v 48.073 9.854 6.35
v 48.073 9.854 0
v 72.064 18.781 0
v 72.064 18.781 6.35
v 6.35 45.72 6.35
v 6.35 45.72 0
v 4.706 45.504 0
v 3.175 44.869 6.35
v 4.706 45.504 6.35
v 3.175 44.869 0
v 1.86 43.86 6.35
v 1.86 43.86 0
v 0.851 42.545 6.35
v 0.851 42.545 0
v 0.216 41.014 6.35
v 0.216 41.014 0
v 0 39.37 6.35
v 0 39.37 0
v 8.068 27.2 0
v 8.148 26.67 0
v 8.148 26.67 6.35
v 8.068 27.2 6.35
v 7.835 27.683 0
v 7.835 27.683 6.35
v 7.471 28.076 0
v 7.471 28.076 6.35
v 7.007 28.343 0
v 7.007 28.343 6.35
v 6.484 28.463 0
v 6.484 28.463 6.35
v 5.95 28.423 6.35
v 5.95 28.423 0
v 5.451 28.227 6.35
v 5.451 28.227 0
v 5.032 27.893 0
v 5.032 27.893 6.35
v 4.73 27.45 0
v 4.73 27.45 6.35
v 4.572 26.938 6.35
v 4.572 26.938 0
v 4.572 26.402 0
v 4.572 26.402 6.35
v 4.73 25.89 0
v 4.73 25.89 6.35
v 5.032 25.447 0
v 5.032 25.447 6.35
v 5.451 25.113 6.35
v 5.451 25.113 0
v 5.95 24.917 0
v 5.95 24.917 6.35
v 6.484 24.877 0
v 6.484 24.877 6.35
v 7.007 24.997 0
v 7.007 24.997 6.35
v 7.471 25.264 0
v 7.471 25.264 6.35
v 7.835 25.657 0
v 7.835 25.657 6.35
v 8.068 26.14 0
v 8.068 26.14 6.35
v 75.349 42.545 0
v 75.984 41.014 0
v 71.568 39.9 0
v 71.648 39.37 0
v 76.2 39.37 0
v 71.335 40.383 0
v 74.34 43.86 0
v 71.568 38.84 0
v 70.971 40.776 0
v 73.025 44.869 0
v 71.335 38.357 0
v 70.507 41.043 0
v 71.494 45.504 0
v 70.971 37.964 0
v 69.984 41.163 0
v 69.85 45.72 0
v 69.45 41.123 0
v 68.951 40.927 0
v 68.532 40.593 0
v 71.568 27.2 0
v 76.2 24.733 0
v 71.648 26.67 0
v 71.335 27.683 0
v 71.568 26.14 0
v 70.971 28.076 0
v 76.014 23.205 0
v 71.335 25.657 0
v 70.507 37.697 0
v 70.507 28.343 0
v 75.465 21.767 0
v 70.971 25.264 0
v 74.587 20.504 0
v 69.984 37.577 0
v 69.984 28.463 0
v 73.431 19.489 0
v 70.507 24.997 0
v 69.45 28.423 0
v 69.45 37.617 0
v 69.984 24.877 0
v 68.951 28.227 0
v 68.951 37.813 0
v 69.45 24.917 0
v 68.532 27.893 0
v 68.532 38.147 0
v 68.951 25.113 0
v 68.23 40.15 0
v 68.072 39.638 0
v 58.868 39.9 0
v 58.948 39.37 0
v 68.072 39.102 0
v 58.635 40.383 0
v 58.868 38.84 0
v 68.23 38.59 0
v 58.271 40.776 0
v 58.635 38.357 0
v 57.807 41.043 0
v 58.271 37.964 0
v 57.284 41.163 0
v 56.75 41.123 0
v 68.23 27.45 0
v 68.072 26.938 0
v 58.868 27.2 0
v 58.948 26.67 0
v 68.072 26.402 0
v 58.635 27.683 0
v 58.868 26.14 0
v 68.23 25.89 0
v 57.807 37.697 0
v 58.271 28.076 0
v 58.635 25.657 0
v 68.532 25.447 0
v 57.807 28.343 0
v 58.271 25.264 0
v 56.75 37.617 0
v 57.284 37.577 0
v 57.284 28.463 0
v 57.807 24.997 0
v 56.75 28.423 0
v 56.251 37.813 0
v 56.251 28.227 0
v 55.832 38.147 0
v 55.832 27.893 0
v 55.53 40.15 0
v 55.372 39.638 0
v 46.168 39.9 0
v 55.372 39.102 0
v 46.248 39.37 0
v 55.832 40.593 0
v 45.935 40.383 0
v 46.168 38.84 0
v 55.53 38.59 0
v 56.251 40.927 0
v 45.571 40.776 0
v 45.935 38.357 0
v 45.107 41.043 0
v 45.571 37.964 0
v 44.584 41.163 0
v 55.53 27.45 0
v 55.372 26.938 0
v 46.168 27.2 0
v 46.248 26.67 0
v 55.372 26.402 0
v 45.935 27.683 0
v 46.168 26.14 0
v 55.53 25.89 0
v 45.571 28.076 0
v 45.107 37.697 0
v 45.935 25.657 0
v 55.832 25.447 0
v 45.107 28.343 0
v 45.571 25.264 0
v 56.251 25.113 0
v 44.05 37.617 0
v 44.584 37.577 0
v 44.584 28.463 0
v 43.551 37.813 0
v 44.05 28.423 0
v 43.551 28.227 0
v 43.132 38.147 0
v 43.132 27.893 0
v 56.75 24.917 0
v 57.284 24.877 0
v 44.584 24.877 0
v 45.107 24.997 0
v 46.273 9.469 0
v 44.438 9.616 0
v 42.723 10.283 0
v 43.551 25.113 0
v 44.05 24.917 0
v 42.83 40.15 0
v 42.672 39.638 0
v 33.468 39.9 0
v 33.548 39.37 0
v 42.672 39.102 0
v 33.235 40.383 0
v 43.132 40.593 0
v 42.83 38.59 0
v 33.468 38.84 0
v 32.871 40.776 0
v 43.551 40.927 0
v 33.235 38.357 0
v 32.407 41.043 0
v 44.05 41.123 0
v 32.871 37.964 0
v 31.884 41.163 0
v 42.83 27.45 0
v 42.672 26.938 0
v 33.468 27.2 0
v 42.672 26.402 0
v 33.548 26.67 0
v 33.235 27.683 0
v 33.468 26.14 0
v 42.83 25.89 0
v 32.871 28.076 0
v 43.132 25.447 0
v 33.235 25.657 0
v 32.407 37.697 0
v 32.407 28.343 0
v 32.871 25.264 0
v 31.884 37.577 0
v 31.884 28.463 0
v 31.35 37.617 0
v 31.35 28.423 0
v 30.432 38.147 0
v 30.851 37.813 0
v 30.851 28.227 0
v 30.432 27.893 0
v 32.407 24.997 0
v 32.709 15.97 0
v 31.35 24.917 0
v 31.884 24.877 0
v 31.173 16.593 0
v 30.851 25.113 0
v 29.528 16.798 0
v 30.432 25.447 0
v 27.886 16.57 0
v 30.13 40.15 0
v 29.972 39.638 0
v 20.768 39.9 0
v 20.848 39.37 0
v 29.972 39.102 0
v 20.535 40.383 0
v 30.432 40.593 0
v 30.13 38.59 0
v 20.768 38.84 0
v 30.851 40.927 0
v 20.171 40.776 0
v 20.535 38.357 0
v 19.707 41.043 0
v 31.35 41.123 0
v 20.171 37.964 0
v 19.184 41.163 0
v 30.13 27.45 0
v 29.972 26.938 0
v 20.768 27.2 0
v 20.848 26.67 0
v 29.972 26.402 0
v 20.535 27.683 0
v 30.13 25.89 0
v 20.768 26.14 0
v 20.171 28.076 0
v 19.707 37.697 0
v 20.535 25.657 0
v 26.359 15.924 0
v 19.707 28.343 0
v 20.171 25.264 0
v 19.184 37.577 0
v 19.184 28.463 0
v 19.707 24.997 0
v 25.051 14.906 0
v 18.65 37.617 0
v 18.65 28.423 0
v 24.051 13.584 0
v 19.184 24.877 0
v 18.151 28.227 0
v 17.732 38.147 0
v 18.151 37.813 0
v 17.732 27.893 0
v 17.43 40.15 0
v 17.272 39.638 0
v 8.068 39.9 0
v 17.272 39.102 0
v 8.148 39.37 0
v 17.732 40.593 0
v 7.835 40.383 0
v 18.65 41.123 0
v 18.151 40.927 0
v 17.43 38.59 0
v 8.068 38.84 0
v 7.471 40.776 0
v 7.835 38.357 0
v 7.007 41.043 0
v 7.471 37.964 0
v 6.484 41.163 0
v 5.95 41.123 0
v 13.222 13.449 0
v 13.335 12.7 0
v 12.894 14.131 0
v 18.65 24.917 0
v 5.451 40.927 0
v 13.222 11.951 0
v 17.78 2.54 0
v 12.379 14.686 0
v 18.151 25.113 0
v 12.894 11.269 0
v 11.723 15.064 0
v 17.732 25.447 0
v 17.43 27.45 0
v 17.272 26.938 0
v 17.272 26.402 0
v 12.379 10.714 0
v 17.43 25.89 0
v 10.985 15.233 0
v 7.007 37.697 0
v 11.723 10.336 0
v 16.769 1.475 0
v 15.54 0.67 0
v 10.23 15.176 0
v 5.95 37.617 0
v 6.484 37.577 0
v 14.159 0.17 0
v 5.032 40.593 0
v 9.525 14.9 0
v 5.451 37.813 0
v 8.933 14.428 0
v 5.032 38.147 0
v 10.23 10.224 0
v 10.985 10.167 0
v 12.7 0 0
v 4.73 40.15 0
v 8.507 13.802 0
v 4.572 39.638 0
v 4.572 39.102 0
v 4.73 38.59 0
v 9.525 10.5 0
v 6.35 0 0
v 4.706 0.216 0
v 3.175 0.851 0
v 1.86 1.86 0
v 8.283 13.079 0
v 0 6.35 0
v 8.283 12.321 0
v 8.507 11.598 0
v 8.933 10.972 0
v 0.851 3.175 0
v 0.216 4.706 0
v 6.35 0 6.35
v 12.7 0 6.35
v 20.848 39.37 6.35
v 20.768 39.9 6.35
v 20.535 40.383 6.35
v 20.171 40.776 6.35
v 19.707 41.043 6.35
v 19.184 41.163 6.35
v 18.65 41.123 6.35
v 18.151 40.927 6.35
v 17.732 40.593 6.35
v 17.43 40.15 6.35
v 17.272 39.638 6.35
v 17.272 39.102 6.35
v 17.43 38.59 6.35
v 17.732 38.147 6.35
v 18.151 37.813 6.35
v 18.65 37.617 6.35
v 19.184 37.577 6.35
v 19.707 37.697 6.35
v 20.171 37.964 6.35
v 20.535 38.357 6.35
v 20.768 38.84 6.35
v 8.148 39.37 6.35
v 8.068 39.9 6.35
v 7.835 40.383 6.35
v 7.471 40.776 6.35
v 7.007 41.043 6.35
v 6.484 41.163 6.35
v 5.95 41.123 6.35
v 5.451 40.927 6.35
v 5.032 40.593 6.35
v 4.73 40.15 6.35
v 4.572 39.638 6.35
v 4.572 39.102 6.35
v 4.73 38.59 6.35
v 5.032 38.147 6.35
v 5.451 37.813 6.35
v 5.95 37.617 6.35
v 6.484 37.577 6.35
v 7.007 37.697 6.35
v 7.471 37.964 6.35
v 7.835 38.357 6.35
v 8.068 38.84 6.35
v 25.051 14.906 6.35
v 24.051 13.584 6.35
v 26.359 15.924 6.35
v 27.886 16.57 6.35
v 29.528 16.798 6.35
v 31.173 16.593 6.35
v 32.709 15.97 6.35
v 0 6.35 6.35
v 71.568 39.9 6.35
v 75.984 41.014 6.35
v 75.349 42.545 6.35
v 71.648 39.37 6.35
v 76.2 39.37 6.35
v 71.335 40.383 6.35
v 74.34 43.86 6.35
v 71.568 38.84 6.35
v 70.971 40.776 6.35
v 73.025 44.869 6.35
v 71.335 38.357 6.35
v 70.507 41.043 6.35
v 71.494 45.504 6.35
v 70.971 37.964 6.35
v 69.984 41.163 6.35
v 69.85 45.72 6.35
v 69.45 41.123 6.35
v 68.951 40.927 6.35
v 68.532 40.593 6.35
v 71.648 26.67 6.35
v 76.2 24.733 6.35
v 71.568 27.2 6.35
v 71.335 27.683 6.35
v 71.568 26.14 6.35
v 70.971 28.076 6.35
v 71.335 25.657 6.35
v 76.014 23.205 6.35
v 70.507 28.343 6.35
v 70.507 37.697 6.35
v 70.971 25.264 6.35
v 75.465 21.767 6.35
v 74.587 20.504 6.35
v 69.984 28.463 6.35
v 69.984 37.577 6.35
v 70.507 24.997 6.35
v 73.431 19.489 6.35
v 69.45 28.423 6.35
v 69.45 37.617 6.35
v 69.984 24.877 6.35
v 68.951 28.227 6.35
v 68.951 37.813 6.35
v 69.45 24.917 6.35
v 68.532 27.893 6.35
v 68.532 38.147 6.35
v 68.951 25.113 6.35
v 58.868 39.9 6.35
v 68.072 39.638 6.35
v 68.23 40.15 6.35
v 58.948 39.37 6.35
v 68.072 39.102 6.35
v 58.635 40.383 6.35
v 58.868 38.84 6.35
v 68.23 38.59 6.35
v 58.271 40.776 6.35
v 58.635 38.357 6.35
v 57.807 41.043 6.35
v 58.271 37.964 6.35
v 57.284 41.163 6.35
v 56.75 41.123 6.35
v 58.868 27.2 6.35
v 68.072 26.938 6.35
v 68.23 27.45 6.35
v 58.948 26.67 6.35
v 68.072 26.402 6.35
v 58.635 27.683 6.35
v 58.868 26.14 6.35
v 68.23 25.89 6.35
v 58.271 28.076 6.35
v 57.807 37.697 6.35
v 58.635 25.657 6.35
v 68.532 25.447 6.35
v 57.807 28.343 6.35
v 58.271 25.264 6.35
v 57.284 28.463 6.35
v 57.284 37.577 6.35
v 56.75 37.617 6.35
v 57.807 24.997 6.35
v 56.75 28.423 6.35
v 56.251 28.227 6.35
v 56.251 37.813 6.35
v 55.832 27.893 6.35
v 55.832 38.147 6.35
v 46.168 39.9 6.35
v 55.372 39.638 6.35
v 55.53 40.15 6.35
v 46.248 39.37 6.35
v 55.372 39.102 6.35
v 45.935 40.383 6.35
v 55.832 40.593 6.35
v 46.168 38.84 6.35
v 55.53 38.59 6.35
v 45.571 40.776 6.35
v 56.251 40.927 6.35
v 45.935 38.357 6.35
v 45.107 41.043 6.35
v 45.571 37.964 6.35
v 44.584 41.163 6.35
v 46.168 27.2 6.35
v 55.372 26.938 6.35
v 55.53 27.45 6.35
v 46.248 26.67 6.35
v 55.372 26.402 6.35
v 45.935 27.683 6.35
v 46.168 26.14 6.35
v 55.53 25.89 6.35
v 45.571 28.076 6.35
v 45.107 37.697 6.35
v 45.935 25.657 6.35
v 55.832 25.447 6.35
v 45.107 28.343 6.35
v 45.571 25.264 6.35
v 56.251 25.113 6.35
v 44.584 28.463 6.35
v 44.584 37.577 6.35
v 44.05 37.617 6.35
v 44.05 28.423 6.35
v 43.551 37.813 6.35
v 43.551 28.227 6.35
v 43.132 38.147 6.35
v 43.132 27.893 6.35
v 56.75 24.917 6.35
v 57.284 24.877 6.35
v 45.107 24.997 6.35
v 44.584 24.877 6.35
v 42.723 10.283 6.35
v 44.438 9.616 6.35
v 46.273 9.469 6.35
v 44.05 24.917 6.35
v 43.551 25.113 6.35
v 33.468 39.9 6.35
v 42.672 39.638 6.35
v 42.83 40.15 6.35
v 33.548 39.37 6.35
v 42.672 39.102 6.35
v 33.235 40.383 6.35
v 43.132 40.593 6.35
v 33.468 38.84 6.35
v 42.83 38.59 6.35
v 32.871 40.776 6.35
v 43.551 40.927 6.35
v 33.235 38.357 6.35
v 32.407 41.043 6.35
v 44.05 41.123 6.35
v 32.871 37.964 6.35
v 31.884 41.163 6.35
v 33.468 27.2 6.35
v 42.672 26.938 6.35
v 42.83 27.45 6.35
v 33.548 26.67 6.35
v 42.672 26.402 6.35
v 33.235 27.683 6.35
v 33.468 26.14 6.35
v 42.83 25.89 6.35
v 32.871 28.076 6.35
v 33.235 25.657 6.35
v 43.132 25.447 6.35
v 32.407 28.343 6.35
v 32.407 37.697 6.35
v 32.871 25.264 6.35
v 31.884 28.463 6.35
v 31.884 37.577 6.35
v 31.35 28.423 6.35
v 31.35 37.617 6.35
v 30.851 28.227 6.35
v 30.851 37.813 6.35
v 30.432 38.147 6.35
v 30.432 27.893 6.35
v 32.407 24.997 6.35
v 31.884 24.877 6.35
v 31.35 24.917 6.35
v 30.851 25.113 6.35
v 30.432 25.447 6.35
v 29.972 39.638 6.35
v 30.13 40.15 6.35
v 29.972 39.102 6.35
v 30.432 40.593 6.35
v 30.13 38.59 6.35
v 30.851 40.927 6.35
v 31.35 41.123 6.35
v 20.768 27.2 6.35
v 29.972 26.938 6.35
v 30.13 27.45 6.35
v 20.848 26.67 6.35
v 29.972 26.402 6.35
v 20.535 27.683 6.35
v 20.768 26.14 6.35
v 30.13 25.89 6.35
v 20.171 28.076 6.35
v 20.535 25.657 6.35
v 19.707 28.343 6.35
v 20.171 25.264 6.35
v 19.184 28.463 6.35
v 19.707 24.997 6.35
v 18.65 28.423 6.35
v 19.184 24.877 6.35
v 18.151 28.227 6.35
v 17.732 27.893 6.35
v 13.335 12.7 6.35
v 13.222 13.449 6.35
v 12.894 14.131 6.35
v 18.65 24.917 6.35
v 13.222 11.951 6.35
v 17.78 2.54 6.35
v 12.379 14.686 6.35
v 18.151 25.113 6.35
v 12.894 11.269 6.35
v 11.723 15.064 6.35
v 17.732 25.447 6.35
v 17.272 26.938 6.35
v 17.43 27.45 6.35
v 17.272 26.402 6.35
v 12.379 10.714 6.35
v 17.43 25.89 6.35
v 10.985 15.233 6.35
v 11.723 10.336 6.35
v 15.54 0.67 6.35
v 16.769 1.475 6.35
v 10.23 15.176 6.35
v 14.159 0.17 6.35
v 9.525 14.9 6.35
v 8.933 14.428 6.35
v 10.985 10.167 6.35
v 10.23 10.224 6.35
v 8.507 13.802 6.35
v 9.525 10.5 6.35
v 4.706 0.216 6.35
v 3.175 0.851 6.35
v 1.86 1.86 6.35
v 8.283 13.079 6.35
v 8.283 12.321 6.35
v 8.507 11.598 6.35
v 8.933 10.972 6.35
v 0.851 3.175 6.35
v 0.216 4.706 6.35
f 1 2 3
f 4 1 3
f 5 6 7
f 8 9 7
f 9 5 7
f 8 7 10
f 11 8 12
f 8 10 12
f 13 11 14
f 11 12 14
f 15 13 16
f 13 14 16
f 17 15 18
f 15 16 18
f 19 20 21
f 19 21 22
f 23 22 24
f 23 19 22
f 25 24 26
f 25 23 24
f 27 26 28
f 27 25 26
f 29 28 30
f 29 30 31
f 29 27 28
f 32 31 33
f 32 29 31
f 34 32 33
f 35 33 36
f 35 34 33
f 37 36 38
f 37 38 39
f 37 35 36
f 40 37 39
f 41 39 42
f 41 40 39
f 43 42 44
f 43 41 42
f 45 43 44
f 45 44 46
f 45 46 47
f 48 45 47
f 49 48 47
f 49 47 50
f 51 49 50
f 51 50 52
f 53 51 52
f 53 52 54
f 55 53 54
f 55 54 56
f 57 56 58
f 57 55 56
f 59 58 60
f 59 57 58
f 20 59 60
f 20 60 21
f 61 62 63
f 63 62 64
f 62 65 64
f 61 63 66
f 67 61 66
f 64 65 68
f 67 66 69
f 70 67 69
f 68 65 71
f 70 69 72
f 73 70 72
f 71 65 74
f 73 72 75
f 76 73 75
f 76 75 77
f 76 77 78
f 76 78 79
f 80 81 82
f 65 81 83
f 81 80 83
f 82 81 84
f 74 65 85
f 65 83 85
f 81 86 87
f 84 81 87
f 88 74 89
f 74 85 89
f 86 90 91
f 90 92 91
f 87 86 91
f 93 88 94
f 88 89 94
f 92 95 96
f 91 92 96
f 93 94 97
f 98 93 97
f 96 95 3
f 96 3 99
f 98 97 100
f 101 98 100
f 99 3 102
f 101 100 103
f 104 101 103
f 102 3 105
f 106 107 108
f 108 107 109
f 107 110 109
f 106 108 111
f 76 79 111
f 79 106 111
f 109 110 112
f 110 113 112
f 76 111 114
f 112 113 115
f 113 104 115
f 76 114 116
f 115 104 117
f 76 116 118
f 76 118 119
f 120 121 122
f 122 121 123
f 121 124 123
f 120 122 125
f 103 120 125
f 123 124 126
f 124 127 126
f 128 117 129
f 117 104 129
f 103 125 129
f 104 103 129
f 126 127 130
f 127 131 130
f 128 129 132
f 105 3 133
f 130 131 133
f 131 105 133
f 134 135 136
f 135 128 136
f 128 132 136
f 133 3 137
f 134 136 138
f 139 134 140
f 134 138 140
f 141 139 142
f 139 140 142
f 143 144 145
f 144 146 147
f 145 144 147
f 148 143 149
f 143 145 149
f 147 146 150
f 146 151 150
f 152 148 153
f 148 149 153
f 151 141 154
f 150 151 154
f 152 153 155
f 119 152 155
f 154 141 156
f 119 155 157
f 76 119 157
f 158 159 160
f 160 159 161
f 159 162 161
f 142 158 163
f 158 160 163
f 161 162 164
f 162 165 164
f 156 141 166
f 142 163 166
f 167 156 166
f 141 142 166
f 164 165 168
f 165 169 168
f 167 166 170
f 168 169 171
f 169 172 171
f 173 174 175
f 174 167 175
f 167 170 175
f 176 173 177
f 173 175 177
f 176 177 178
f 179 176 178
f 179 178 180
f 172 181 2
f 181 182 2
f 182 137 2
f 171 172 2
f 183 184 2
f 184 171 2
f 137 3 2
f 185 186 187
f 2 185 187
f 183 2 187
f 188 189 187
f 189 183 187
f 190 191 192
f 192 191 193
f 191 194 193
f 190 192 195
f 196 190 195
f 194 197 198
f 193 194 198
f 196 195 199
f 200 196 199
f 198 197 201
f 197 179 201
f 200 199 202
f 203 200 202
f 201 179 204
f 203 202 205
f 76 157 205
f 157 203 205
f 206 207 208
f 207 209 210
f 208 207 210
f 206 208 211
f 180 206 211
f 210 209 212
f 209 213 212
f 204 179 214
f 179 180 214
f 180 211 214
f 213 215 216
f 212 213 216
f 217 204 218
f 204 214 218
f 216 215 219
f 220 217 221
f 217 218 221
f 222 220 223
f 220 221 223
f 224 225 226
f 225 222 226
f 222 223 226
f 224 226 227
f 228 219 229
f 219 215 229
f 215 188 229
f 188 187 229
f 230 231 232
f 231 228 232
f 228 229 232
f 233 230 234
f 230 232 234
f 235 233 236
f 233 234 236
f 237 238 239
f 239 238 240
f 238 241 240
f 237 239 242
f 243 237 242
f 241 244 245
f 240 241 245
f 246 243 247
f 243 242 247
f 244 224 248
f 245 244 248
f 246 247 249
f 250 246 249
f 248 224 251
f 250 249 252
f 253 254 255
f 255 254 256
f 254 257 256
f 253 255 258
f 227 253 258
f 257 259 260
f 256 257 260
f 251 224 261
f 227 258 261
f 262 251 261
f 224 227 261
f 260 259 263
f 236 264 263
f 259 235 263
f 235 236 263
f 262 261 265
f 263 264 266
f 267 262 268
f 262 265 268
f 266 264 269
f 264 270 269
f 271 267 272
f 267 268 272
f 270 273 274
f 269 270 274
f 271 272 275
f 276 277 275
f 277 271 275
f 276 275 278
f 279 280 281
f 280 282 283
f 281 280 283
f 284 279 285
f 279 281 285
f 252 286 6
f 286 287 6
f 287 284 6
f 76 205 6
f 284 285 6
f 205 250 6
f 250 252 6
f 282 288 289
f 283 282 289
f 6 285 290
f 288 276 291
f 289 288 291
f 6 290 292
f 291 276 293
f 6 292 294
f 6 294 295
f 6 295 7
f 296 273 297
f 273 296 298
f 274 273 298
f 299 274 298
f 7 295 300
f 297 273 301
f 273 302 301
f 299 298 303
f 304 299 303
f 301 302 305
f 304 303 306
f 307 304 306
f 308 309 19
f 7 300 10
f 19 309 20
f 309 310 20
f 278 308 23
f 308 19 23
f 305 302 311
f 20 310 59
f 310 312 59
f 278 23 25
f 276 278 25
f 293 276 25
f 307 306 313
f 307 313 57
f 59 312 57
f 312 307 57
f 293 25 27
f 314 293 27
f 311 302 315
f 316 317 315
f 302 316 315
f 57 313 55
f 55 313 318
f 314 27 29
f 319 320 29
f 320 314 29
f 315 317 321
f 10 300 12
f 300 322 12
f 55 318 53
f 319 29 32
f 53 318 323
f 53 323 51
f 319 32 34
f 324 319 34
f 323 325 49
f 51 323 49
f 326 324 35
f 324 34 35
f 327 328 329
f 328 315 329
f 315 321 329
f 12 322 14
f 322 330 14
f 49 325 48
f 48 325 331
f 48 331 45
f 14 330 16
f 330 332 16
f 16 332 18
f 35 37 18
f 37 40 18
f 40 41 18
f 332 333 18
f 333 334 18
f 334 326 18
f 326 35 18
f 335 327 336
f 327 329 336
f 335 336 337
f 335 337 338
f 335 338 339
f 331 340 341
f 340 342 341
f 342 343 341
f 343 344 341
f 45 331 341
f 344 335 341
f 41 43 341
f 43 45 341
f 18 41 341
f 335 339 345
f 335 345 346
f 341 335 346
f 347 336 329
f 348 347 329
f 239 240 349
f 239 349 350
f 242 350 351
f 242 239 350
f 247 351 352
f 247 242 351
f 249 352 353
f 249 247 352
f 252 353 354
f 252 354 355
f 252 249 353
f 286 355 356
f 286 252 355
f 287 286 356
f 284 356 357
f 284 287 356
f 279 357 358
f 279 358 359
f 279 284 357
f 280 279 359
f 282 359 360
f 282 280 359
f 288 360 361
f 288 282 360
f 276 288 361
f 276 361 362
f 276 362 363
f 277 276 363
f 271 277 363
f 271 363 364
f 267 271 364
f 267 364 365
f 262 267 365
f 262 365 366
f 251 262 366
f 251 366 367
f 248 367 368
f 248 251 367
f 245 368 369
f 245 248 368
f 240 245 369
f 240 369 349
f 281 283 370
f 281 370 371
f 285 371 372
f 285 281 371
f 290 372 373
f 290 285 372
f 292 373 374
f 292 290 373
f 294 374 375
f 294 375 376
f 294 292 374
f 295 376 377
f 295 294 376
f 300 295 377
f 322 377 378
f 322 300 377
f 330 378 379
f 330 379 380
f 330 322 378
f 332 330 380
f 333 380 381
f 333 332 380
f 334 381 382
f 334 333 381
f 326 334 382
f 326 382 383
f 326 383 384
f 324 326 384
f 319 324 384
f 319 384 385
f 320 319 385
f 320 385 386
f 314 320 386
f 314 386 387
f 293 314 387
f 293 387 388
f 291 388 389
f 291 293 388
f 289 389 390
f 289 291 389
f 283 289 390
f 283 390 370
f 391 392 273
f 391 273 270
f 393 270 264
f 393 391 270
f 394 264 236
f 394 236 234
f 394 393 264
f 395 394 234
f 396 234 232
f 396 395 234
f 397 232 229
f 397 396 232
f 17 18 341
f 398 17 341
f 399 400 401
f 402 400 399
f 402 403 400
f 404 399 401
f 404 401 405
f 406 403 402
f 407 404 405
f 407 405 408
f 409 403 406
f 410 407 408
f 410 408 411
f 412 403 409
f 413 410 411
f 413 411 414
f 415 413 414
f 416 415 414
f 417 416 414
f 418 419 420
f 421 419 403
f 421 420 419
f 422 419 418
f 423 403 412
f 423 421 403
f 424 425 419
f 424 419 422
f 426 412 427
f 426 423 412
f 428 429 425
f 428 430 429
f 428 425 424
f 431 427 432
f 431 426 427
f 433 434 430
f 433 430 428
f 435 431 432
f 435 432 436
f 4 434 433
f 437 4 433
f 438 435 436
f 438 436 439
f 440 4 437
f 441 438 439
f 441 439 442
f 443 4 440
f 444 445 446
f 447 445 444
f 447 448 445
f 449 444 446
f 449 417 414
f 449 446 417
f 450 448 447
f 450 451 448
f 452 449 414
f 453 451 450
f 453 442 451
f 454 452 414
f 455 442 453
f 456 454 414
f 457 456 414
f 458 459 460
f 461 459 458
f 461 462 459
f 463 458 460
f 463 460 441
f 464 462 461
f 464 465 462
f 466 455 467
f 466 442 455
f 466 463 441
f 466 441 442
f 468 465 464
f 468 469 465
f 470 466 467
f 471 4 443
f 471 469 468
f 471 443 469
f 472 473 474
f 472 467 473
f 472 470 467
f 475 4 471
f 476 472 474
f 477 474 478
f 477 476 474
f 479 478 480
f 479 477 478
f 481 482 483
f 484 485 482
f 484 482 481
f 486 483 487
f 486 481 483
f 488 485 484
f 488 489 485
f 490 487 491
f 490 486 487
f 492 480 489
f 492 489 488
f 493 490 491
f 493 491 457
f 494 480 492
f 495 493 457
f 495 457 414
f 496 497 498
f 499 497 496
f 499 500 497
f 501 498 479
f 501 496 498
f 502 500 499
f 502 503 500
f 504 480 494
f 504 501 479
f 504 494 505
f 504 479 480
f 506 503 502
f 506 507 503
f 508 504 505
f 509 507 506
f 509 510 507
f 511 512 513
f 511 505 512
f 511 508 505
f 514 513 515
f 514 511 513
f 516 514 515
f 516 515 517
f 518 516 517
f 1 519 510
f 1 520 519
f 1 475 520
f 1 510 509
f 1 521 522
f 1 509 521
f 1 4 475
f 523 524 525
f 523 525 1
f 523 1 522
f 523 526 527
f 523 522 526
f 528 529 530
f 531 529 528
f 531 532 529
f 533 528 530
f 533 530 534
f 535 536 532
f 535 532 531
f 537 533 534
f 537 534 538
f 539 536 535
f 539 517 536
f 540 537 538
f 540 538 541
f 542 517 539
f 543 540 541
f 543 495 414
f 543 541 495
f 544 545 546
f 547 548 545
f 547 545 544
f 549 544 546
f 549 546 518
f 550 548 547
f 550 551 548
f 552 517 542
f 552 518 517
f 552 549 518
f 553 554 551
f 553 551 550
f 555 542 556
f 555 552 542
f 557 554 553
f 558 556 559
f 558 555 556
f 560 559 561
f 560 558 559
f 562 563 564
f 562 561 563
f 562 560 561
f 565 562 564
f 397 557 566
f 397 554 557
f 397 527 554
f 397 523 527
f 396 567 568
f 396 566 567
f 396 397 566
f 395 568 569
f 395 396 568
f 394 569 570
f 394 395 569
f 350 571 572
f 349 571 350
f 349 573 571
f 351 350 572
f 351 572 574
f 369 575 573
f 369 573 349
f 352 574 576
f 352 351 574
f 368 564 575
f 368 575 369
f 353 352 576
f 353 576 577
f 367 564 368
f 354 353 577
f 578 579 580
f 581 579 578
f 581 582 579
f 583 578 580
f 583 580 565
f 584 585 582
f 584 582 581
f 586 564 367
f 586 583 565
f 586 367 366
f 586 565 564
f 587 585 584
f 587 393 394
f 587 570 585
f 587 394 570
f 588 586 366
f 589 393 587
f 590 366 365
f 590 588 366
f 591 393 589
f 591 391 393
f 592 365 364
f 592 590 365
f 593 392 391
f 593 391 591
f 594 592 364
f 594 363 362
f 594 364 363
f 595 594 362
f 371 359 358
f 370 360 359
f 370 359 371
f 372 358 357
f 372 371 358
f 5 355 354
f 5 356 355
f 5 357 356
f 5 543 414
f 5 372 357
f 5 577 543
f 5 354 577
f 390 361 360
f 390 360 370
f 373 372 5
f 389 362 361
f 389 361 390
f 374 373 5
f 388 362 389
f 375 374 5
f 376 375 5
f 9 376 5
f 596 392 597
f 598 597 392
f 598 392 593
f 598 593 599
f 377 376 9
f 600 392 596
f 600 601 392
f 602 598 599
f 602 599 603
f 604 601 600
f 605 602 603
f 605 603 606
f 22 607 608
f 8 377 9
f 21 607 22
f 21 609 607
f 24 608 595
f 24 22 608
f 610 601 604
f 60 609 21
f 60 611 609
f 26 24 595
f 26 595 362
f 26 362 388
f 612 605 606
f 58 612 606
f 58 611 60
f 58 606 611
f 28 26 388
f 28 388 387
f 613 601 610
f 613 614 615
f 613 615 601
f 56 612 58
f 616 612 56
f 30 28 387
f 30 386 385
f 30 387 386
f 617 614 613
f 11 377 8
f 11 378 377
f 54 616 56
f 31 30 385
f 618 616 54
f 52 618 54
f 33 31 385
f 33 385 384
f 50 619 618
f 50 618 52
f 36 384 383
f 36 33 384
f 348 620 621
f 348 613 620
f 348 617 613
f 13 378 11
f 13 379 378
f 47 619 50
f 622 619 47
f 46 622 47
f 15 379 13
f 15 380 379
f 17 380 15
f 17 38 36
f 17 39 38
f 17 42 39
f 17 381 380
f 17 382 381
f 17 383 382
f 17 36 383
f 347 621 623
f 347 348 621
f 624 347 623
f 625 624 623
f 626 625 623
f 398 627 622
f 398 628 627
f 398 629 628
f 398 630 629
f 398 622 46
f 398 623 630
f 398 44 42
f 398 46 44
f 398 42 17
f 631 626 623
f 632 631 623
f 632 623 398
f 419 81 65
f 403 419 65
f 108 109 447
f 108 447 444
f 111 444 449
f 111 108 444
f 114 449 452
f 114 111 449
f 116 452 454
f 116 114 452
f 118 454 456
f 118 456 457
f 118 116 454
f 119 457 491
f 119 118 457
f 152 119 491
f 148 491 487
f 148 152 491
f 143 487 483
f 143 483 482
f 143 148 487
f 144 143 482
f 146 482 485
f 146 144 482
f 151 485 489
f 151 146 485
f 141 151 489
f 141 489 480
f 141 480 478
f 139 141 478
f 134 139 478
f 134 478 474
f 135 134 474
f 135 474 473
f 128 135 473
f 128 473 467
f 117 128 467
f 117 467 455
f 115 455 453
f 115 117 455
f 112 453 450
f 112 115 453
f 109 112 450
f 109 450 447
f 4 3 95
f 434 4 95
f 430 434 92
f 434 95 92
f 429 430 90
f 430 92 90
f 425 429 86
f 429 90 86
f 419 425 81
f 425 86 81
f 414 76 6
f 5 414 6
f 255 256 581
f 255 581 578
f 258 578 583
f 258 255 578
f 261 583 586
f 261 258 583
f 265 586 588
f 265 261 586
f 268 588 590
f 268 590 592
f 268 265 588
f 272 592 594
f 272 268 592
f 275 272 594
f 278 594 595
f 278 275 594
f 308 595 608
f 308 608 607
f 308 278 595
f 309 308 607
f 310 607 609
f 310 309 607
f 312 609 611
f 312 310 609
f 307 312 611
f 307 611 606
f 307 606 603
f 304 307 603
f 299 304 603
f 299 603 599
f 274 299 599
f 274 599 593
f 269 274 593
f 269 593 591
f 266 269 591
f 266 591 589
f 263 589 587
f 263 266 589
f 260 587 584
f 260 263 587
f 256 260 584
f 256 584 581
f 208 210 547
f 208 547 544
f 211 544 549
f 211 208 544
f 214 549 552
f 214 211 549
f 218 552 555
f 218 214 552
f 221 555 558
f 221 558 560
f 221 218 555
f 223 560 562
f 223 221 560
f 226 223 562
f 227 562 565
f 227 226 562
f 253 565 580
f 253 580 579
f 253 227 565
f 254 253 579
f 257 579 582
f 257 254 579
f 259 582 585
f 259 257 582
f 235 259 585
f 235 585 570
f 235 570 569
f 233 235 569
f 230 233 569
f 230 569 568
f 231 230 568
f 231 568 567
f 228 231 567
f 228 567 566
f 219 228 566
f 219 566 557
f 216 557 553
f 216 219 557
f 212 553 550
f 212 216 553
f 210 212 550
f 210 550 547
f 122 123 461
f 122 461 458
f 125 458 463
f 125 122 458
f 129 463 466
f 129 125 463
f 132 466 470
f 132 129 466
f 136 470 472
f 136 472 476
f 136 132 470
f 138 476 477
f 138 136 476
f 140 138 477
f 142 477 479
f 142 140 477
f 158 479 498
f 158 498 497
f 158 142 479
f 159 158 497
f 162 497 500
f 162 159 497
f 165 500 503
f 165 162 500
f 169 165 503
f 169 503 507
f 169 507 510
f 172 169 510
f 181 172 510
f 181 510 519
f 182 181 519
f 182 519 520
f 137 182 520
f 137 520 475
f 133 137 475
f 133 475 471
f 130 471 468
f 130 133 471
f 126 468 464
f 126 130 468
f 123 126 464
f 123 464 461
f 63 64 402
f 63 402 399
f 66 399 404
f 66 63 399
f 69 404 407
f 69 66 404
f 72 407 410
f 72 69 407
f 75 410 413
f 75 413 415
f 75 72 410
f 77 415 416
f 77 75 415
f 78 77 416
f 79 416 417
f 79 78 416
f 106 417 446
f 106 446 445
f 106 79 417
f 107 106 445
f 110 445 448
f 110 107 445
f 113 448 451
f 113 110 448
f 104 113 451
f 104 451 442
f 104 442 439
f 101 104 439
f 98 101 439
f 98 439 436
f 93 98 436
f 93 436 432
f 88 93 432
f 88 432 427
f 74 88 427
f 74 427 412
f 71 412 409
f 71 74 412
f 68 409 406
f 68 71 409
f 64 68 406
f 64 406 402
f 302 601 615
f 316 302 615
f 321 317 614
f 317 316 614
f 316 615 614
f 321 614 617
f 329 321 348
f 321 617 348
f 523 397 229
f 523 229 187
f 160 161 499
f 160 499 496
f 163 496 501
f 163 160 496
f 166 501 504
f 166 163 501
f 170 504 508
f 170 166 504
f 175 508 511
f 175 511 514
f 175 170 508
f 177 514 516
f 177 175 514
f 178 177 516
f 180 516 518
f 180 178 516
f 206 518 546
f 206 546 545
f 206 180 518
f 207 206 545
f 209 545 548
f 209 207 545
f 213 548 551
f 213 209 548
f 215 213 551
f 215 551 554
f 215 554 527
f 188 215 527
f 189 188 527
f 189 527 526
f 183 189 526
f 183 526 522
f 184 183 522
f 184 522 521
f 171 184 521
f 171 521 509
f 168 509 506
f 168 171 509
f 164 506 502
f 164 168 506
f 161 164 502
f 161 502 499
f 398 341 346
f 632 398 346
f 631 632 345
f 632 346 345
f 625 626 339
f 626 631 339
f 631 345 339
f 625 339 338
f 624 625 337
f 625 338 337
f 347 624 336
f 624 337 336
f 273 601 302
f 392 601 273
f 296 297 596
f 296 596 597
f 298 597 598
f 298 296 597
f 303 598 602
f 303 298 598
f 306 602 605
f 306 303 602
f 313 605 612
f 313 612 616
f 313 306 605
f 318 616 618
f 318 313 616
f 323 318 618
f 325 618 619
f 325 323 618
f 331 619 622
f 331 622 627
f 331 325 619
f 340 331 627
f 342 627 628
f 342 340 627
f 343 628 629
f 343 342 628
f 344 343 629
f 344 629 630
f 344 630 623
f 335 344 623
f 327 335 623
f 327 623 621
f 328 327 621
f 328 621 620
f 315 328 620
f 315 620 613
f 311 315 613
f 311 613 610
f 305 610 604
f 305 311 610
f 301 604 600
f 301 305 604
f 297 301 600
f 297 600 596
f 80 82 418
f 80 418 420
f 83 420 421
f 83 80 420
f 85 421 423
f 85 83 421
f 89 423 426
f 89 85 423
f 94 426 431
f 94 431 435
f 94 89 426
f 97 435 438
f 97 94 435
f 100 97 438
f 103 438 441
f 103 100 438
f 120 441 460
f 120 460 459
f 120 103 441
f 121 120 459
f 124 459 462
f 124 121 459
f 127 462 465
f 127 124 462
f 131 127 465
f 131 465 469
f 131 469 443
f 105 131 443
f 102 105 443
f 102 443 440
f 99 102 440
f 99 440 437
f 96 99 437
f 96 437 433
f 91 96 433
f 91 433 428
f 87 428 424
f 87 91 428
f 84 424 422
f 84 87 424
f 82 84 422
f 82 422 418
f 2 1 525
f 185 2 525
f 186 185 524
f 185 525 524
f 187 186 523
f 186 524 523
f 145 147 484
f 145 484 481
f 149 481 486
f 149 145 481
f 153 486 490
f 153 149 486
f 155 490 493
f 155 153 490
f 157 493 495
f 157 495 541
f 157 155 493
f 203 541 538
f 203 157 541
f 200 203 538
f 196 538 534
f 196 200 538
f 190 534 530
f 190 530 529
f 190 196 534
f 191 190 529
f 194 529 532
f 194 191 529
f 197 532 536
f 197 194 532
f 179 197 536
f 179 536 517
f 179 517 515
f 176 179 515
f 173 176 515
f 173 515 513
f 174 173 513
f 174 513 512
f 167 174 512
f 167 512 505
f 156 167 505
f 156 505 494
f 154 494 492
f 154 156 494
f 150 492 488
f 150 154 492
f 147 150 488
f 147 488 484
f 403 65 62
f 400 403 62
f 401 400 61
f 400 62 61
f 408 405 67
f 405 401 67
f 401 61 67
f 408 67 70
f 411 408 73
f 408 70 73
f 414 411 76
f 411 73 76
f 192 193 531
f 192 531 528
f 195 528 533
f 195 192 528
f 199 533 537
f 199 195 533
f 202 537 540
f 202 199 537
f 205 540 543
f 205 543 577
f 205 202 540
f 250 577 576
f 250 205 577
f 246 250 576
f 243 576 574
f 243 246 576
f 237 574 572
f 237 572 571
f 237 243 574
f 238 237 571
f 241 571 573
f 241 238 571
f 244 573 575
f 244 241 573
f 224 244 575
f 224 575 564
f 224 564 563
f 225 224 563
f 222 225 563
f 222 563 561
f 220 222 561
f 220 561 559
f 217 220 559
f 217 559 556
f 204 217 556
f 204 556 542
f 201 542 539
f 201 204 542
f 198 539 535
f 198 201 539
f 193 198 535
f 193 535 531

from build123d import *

# Parameters (mm, degrees)
SKETCH1_R           = 2.54
SKETCH1_R_2         = 1.797730585
BOSS_EXTRUDE1_DEPTH = 6.35
CUT_EXTRUDE1_DEPTH  = 90.090296329
FILLET1_R           = 6.35


with BuildPart() as part:
    # Sketch1 → Boss-Extrude1 (new body)
    with BuildSketch(Plane.XY):
        Polygon((21.59, 0), (76.2, 20.32), (76.2, 45.72), (0, 45.72), (0, 0), align=None)
        with Locations((10.795, 12.7)):
            Circle(SKETCH1_R, mode=Mode.SUBTRACT)
        with Locations((69.85, 39.37)):
            Circle(SKETCH1_R_2, mode=Mode.SUBTRACT)
        with Locations((57.15, 39.37)):
            Circle(SKETCH1_R_2, mode=Mode.SUBTRACT)
        with Locations((44.45, 39.37)):
            Circle(SKETCH1_R_2, mode=Mode.SUBTRACT)
        with Locations((31.75, 39.37)):
            Circle(SKETCH1_R_2, mode=Mode.SUBTRACT)
        with Locations((19.05, 39.37)):
            Circle(SKETCH1_R_2, mode=Mode.SUBTRACT)
        with Locations((6.35, 39.37)):
            Circle(SKETCH1_R_2, mode=Mode.SUBTRACT)
        with Locations((57.15, 26.67)):
            Circle(SKETCH1_R_2, mode=Mode.SUBTRACT)
        with Locations((44.45, 26.67)):
            Circle(SKETCH1_R_2, mode=Mode.SUBTRACT)
        with Locations((31.75, 26.67)):
            Circle(SKETCH1_R_2, mode=Mode.SUBTRACT)
        with Locations((19.05, 26.67)):
            Circle(SKETCH1_R_2, mode=Mode.SUBTRACT)
        with Locations((6.35, 26.67)):
            Circle(SKETCH1_R_2, mode=Mode.SUBTRACT)
        with Locations((69.85, 26.67)):
            Circle(SKETCH1_R_2, mode=Mode.SUBTRACT)
    extrude(amount=BOSS_EXTRUDE1_DEPTH)

    # Sketch2 → Cut-Extrude1 (cut, through all)
    with BuildSketch(Plane.XY.offset(6.35)):
        Polygon((17.78, 0), (17.78, 2.54), (27.186735348, 19.105501202), (45.29738426, 8.821352283), (21.59, 0), align=None)
    extrude(amount=-CUT_EXTRUDE1_DEPTH, mode=Mode.SUBTRACT)

    # Fillet1
    # the kernel refuses this fillet: 6.35 mm, written as the material it adds along each edge
    with BuildSketch(Plane(origin=(27.186735348, 19.105501202, 6.35), x_dir=(0.8695801156095444, -0.4937918818049677, 0), z_dir=(0, 0, -1))) as fillet1_piece_1:
        with BuildLine():
            CenterArc((FILLET1_R, FILLET1_R), FILLET1_R, 180, 90)
            Line((0, FILLET1_R), (0, 0))
            Line((0, 0), (FILLET1_R, 0))
        make_face()
    extrude(amount=6.35)
    # the kernel refuses this fillet: 6.35 mm, written as the material it takes off along each edge
    with BuildSketch(Plane(origin=(45.29738426, 8.821352283, 13.752634073), x_dir=(0.9372218510575621, 0.3487337120214175, 0), z_dir=(0, 0, -1))) as fillet1_2_piece_1:
        with BuildLine():
            CenterArc((FILLET1_R * 0.466307658155, -FILLET1_R), FILLET1_R, 90, 50)
            Line((-FILLET1_R * 0.299736784964, -FILLET1_R * 0.357212390313), (0, 0))
            Line((0, 0), (FILLET1_R * 0.466307658155, 0))
        make_face()
    extrude(amount=21.155268146, mode=Mode.SUBTRACT)
    with BuildSketch(Plane(origin=(76.2, 20.32, -11.031382068), x_dir=(-0.9372218510575616, -0.34873371202141845, 0), z_dir=(0, 0, 1))) as fillet1_2_piece_2:
        with BuildLine():
            CenterArc((FILLET1_R * 0.694890209019, -FILLET1_R), FILLET1_R, 90, 69.590117166)
            Line((-FILLET1_R * 0.242331642039, -FILLET1_R * 0.651266287979), (0, 0))
            Line((0, 0), (FILLET1_R * 0.694890209019, 0))
        make_face()
    extrude(amount=28.412764136, mode=Mode.SUBTRACT)
    with BuildSketch(Plane(origin=(76.2, 45.72, -15.875), x_dir=(0, -1, 0), z_dir=(0, 0, 1))) as fillet1_2_piece_3:
        with BuildLine():
            CenterArc((FILLET1_R, -FILLET1_R), FILLET1_R, 90, 90)
            Line((0, -FILLET1_R), (0, 0))
            Line((0, 0), (FILLET1_R, 0))
        make_face()
    extrude(amount=38.1, mode=Mode.SUBTRACT)
    with BuildSketch(Plane(origin=(0, 45.72, -15.875), x_dir=(0, -1, 0), z_dir=(0, 0, 1)), Plane(origin=(0, 0, -15.875), x_dir=(1, 0, 0), z_dir=(0, 0, 1))) as fillet1_2_piece_4:
        with BuildLine():
            CenterArc((FILLET1_R, FILLET1_R), FILLET1_R, 180, 90)
            Line((0, FILLET1_R), (0, 0))
            Line((0, 0), (FILLET1_R, 0))
        make_face()
    extrude(amount=38.1, mode=Mode.SUBTRACT)
    with BuildSketch(Plane(origin=(17.78, 0, 19.05), x_dir=(0, 1, 0), z_dir=(0, 0, -1))) as fillet1_2_piece_5:
        with BuildLine():
            CenterArc((6.35, -5.08), FILLET1_R, 126.869897646, 53.130102354)
            Line((0, -5.08), (0, 0))
            Line((0, 0), (2.54, 0))
        make_face()
    extrude(amount=31.75, mode=Mode.SUBTRACT)


solid = part.part
